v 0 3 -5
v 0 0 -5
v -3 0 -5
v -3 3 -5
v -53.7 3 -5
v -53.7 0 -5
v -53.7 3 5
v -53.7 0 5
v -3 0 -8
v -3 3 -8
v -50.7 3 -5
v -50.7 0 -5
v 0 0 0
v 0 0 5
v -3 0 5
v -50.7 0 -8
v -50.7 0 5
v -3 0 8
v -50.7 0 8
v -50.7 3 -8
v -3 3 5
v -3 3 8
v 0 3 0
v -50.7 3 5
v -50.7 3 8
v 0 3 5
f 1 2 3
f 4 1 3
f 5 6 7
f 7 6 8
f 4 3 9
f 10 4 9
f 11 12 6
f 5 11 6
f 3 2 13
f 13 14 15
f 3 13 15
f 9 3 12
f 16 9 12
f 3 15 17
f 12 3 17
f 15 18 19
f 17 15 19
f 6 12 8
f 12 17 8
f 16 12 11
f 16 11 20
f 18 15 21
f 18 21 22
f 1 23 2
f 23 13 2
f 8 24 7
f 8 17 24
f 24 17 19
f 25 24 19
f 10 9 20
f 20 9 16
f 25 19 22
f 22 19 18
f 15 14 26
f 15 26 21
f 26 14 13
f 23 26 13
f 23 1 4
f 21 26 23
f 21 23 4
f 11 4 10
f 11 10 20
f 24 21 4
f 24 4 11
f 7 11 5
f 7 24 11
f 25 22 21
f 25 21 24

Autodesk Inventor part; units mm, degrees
ref_plane "YZ Plane" through (0, 0, 0) normal (1, 0, 0) x (0, 1, 0)
ref_plane "XZ Plane" through (0, 0, 0) normal (0, 1, 0) x (-1, 0, 0)
ref_plane "XY Plane" through (0, 0, 0) normal (0, 0, 1) x (1, 0, 0)
sketch "草圖1" plane through (0, 0, 0) normal (0, 1, 0) x (-1, 0, 0)
  line L0 (0, 5) -> (3, 5)
  line L1 (3, 5) -> (3, 8)
  line L2 (50.7, 5) -> (53.7, 5)
  line L3 (50.7, -5) -> (53.7, -5)
  line L4 (50.7, -5) -> (50.7, -8)
  line L5 (3, -5) -> (3, -8)
  line L6 (0, -5) -> (3, -5)
  line L7 (3, -8) -> (50.7, -8)
  line L8 (53.7, -5) -> (53.7, 5)
  line L9 (50.7, 8) -> (3, 8)
  line L10 (0, 5) -> (0, -5)
  line L11 (0, 0) -> (0, -38.3248)
  line L12 (50.7, 5) -> (50.7, 8)
  dimension "d1" = 10
  dimension "d2" = 3
  dimension "d3" = 3
  dimension "d8" = 53.7
extrude "擠出1" add sketch "草圖1" along normal blind 3
properties part number "beam" material "木材 (楓木)"
